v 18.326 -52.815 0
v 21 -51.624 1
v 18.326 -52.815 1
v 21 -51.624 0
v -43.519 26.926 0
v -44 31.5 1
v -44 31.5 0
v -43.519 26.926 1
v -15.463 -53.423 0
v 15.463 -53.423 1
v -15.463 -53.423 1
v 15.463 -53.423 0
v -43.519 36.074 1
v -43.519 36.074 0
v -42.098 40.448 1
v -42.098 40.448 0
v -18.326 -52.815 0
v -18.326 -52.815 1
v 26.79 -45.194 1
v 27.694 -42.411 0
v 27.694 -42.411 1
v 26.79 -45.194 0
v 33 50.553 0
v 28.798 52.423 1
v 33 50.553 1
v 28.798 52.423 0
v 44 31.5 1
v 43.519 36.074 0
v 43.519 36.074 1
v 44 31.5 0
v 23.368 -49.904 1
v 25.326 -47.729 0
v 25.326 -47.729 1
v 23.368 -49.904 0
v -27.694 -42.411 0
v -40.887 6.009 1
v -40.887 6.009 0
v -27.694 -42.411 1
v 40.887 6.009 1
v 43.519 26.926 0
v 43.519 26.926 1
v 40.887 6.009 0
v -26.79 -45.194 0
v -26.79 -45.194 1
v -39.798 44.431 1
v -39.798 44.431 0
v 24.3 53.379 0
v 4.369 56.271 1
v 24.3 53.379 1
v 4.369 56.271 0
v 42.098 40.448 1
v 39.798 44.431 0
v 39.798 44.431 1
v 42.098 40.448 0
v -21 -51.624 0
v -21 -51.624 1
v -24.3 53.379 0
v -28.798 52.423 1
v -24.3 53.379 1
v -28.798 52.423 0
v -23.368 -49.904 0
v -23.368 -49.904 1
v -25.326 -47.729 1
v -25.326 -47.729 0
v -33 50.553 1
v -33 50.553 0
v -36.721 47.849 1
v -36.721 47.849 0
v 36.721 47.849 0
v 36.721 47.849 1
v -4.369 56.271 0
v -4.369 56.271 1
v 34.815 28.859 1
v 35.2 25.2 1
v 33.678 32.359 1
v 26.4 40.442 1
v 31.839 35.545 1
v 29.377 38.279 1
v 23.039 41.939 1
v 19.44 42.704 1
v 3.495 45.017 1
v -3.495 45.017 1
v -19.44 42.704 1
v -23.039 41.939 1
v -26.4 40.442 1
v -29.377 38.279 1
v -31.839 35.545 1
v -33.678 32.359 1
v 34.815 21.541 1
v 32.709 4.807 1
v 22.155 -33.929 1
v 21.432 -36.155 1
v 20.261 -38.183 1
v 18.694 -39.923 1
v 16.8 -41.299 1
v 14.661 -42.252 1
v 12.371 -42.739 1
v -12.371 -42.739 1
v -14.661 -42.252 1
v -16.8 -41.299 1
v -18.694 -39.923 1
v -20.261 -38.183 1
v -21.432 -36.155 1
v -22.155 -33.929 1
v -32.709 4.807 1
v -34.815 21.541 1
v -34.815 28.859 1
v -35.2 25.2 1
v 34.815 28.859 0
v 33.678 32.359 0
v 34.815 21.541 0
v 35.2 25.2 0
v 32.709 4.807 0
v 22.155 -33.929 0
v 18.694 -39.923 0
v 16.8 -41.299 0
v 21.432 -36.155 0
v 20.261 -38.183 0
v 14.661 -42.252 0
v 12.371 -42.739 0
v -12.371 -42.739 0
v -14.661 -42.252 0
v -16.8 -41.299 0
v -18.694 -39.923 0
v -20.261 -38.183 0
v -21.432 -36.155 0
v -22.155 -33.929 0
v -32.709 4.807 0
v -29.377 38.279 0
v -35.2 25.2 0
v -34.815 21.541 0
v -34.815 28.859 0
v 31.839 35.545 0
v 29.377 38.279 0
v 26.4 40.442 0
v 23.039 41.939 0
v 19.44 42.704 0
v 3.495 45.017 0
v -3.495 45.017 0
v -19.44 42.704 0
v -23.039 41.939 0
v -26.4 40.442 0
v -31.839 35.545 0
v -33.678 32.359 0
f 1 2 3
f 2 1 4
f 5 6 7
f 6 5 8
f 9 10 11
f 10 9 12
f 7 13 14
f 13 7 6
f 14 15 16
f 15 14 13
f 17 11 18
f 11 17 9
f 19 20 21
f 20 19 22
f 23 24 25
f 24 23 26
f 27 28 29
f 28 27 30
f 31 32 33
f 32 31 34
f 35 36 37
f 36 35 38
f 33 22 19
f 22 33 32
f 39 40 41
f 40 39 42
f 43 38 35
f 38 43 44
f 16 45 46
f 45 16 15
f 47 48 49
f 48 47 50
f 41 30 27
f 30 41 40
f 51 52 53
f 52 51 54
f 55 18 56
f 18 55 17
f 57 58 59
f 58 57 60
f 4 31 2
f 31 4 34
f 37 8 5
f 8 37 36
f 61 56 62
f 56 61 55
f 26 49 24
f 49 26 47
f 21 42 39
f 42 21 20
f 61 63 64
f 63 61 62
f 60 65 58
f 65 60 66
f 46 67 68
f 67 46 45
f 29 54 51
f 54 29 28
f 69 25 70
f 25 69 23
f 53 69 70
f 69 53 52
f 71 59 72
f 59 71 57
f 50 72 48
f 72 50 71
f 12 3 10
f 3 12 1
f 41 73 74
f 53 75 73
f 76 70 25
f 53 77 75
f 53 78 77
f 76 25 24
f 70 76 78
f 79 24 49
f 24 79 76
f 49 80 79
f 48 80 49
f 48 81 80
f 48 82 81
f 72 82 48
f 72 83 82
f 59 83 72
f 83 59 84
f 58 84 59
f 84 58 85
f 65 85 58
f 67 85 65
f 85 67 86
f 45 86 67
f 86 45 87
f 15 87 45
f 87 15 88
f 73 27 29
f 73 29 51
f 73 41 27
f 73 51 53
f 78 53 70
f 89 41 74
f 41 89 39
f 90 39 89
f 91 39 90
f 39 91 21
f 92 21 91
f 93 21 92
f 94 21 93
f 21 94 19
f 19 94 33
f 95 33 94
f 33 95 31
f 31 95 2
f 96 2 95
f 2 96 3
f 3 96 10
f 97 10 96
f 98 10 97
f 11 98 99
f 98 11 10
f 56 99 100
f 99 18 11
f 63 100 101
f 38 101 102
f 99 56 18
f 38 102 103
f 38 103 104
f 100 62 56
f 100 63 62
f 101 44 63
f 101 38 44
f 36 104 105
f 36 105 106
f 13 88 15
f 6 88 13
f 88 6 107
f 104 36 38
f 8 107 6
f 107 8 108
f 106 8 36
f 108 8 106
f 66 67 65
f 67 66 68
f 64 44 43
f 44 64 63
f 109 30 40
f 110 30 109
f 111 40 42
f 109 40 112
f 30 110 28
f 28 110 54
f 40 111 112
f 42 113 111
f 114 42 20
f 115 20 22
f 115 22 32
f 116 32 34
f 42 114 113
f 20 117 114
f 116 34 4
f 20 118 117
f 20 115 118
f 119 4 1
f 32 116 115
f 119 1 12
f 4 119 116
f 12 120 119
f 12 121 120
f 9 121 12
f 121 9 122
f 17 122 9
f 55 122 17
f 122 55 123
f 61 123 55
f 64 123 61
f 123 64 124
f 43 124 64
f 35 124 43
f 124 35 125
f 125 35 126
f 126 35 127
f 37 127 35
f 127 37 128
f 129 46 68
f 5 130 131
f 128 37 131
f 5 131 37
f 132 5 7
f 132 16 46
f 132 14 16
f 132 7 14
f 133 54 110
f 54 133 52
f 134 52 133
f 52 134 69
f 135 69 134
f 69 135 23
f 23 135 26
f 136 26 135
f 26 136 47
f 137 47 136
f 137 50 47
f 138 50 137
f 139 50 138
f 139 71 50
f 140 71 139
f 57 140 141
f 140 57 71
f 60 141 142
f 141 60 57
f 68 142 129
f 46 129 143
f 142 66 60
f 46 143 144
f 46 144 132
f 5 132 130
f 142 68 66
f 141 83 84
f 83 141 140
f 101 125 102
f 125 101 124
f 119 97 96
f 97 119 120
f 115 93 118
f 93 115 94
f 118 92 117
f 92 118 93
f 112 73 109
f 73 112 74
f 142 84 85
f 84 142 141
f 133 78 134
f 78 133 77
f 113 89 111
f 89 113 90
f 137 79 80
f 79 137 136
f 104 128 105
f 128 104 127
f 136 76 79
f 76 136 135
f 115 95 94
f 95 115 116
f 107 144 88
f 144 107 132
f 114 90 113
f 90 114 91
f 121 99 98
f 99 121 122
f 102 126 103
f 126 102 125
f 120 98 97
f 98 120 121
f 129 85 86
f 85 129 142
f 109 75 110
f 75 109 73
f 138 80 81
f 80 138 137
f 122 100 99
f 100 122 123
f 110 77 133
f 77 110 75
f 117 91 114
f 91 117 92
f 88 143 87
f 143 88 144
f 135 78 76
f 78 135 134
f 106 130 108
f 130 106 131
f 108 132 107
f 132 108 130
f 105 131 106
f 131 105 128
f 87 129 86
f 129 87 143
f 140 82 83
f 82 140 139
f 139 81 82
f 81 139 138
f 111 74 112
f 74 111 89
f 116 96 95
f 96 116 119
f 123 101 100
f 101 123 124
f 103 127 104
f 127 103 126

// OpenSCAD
//points = [[1,4.4],];
h=107;
difference()
{
abek1Mask( dg = 44, dk = 28, h=h);
translate([0,0,-1])
scale([0.8,0.8,1])
abek1Mask( dg = 44, dk = 28, h=h, dz =3);
}

//cube([35,85,1],center = true);
module abek1Mask(dg = 44, dk = 28, h=h, dz = 1 )
{
  hull()
  {
    translate([-dg/2, h/2-dg/2,0]) cylinder(d=dg,h =dz);
    translate([dg/2, h/2-dg/2,0]) cylinder(d=dg,h =dz);
    translate([0, h/2-1.9*dg/2+3,0]) cylinder(d=1.9*dg,h =dz);
    translate([-dk/2, -h/2+dk/2,0]) cylinder(d=dk,h =dz);
    translate([dk/2, -h/2+dk/2,0]) cylinder(d=dk,h =dz);
  }
}//module abek1Mask(dg = 44, dk = 28)
